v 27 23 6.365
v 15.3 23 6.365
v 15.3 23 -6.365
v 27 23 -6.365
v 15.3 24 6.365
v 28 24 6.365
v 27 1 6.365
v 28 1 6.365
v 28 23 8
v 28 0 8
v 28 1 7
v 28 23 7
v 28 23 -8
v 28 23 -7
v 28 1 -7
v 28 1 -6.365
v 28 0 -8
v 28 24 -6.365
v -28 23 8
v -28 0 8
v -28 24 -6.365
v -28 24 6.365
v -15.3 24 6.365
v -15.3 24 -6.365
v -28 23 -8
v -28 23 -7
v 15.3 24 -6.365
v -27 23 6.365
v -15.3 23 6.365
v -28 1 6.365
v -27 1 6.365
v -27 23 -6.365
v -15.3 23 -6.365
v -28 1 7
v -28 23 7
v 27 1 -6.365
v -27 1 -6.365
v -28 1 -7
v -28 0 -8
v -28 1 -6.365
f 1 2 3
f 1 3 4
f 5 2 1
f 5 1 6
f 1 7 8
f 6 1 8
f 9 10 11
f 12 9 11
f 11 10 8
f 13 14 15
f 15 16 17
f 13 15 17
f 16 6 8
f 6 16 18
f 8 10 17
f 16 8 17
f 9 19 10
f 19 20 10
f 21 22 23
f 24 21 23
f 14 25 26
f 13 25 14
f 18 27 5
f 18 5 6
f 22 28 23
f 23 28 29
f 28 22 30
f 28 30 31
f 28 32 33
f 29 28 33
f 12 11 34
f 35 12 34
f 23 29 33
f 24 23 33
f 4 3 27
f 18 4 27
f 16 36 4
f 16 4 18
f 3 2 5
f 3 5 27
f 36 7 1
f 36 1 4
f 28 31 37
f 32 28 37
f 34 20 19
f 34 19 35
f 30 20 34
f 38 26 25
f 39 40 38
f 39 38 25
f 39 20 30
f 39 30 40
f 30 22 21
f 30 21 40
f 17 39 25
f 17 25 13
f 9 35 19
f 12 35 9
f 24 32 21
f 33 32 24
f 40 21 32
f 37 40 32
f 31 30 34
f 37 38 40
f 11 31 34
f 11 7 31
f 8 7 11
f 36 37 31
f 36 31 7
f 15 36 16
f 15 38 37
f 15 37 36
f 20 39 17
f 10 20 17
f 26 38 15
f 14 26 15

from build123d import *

# Parameters (mm, degrees)
SKETCH1_W           = 56
SKETCH1_H           = 16
BOSS_EXTRUDE1_DEPTH = 1
BOSS_EXTRUDE2_DEPTH = 22
SKETCH3_W           = 1
SKETCH3_H           = 12.73
BOSS_EXTRUDE3_DEPTH = 22
SKETCH4_W           = 12.7
SKETCH4_H           = 12.73
BOSS_EXTRUDE4_DEPTH = 1


with BuildPart() as part:
    # Sketch1 → Boss-Extrude1 (new body)
    with BuildSketch(Plane(origin=(0, 0, 0), x_dir=(1, 0, 0), z_dir=(0, 1, 0))):
        Rectangle(SKETCH1_W, SKETCH1_H)
    extrude(amount=BOSS_EXTRUDE1_DEPTH)

    # Sketch2 → Boss-Extrude2 (add)
    with BuildSketch(Plane(origin=(0, 1, 0), x_dir=(1, 0, 0), z_dir=(0, 1, 0))):
        Polygon((28, -7), (27, -7), (-27, -7), (-28, -7), (-28, -8), (28, -8), align=None)
        Polygon((-27, 7), (27, 7), (28, 7), (28, 8), (-28, 8), (-28, 7), align=None)
    extrude(amount=BOSS_EXTRUDE2_DEPTH)

    # Sketch3 → Boss-Extrude3 (add)
    with BuildSketch(Plane(origin=(0, 1, 0), x_dir=(1, 0, 0), z_dir=(0, 1, 0))):
        with Locations((27.5, 0)):
            Rectangle(SKETCH3_W, SKETCH3_H)
        with Locations((-27.5, 0)):
            Rectangle(SKETCH3_W, SKETCH3_H)
    extrude(amount=BOSS_EXTRUDE3_DEPTH)

    # Sketch4 → Boss-Extrude4 (add)
    with BuildSketch(Plane(origin=(0, 23, 0), x_dir=(1, 0, 0), z_dir=(0, 1, 0))):
        with Locations((-21.65, 0)):
            Rectangle(SKETCH4_W, SKETCH4_H)
        with Locations((21.65, 0)):
            Rectangle(SKETCH4_W, SKETCH4_H)
    extrude(amount=BOSS_EXTRUDE4_DEPTH)


solid = part.part
